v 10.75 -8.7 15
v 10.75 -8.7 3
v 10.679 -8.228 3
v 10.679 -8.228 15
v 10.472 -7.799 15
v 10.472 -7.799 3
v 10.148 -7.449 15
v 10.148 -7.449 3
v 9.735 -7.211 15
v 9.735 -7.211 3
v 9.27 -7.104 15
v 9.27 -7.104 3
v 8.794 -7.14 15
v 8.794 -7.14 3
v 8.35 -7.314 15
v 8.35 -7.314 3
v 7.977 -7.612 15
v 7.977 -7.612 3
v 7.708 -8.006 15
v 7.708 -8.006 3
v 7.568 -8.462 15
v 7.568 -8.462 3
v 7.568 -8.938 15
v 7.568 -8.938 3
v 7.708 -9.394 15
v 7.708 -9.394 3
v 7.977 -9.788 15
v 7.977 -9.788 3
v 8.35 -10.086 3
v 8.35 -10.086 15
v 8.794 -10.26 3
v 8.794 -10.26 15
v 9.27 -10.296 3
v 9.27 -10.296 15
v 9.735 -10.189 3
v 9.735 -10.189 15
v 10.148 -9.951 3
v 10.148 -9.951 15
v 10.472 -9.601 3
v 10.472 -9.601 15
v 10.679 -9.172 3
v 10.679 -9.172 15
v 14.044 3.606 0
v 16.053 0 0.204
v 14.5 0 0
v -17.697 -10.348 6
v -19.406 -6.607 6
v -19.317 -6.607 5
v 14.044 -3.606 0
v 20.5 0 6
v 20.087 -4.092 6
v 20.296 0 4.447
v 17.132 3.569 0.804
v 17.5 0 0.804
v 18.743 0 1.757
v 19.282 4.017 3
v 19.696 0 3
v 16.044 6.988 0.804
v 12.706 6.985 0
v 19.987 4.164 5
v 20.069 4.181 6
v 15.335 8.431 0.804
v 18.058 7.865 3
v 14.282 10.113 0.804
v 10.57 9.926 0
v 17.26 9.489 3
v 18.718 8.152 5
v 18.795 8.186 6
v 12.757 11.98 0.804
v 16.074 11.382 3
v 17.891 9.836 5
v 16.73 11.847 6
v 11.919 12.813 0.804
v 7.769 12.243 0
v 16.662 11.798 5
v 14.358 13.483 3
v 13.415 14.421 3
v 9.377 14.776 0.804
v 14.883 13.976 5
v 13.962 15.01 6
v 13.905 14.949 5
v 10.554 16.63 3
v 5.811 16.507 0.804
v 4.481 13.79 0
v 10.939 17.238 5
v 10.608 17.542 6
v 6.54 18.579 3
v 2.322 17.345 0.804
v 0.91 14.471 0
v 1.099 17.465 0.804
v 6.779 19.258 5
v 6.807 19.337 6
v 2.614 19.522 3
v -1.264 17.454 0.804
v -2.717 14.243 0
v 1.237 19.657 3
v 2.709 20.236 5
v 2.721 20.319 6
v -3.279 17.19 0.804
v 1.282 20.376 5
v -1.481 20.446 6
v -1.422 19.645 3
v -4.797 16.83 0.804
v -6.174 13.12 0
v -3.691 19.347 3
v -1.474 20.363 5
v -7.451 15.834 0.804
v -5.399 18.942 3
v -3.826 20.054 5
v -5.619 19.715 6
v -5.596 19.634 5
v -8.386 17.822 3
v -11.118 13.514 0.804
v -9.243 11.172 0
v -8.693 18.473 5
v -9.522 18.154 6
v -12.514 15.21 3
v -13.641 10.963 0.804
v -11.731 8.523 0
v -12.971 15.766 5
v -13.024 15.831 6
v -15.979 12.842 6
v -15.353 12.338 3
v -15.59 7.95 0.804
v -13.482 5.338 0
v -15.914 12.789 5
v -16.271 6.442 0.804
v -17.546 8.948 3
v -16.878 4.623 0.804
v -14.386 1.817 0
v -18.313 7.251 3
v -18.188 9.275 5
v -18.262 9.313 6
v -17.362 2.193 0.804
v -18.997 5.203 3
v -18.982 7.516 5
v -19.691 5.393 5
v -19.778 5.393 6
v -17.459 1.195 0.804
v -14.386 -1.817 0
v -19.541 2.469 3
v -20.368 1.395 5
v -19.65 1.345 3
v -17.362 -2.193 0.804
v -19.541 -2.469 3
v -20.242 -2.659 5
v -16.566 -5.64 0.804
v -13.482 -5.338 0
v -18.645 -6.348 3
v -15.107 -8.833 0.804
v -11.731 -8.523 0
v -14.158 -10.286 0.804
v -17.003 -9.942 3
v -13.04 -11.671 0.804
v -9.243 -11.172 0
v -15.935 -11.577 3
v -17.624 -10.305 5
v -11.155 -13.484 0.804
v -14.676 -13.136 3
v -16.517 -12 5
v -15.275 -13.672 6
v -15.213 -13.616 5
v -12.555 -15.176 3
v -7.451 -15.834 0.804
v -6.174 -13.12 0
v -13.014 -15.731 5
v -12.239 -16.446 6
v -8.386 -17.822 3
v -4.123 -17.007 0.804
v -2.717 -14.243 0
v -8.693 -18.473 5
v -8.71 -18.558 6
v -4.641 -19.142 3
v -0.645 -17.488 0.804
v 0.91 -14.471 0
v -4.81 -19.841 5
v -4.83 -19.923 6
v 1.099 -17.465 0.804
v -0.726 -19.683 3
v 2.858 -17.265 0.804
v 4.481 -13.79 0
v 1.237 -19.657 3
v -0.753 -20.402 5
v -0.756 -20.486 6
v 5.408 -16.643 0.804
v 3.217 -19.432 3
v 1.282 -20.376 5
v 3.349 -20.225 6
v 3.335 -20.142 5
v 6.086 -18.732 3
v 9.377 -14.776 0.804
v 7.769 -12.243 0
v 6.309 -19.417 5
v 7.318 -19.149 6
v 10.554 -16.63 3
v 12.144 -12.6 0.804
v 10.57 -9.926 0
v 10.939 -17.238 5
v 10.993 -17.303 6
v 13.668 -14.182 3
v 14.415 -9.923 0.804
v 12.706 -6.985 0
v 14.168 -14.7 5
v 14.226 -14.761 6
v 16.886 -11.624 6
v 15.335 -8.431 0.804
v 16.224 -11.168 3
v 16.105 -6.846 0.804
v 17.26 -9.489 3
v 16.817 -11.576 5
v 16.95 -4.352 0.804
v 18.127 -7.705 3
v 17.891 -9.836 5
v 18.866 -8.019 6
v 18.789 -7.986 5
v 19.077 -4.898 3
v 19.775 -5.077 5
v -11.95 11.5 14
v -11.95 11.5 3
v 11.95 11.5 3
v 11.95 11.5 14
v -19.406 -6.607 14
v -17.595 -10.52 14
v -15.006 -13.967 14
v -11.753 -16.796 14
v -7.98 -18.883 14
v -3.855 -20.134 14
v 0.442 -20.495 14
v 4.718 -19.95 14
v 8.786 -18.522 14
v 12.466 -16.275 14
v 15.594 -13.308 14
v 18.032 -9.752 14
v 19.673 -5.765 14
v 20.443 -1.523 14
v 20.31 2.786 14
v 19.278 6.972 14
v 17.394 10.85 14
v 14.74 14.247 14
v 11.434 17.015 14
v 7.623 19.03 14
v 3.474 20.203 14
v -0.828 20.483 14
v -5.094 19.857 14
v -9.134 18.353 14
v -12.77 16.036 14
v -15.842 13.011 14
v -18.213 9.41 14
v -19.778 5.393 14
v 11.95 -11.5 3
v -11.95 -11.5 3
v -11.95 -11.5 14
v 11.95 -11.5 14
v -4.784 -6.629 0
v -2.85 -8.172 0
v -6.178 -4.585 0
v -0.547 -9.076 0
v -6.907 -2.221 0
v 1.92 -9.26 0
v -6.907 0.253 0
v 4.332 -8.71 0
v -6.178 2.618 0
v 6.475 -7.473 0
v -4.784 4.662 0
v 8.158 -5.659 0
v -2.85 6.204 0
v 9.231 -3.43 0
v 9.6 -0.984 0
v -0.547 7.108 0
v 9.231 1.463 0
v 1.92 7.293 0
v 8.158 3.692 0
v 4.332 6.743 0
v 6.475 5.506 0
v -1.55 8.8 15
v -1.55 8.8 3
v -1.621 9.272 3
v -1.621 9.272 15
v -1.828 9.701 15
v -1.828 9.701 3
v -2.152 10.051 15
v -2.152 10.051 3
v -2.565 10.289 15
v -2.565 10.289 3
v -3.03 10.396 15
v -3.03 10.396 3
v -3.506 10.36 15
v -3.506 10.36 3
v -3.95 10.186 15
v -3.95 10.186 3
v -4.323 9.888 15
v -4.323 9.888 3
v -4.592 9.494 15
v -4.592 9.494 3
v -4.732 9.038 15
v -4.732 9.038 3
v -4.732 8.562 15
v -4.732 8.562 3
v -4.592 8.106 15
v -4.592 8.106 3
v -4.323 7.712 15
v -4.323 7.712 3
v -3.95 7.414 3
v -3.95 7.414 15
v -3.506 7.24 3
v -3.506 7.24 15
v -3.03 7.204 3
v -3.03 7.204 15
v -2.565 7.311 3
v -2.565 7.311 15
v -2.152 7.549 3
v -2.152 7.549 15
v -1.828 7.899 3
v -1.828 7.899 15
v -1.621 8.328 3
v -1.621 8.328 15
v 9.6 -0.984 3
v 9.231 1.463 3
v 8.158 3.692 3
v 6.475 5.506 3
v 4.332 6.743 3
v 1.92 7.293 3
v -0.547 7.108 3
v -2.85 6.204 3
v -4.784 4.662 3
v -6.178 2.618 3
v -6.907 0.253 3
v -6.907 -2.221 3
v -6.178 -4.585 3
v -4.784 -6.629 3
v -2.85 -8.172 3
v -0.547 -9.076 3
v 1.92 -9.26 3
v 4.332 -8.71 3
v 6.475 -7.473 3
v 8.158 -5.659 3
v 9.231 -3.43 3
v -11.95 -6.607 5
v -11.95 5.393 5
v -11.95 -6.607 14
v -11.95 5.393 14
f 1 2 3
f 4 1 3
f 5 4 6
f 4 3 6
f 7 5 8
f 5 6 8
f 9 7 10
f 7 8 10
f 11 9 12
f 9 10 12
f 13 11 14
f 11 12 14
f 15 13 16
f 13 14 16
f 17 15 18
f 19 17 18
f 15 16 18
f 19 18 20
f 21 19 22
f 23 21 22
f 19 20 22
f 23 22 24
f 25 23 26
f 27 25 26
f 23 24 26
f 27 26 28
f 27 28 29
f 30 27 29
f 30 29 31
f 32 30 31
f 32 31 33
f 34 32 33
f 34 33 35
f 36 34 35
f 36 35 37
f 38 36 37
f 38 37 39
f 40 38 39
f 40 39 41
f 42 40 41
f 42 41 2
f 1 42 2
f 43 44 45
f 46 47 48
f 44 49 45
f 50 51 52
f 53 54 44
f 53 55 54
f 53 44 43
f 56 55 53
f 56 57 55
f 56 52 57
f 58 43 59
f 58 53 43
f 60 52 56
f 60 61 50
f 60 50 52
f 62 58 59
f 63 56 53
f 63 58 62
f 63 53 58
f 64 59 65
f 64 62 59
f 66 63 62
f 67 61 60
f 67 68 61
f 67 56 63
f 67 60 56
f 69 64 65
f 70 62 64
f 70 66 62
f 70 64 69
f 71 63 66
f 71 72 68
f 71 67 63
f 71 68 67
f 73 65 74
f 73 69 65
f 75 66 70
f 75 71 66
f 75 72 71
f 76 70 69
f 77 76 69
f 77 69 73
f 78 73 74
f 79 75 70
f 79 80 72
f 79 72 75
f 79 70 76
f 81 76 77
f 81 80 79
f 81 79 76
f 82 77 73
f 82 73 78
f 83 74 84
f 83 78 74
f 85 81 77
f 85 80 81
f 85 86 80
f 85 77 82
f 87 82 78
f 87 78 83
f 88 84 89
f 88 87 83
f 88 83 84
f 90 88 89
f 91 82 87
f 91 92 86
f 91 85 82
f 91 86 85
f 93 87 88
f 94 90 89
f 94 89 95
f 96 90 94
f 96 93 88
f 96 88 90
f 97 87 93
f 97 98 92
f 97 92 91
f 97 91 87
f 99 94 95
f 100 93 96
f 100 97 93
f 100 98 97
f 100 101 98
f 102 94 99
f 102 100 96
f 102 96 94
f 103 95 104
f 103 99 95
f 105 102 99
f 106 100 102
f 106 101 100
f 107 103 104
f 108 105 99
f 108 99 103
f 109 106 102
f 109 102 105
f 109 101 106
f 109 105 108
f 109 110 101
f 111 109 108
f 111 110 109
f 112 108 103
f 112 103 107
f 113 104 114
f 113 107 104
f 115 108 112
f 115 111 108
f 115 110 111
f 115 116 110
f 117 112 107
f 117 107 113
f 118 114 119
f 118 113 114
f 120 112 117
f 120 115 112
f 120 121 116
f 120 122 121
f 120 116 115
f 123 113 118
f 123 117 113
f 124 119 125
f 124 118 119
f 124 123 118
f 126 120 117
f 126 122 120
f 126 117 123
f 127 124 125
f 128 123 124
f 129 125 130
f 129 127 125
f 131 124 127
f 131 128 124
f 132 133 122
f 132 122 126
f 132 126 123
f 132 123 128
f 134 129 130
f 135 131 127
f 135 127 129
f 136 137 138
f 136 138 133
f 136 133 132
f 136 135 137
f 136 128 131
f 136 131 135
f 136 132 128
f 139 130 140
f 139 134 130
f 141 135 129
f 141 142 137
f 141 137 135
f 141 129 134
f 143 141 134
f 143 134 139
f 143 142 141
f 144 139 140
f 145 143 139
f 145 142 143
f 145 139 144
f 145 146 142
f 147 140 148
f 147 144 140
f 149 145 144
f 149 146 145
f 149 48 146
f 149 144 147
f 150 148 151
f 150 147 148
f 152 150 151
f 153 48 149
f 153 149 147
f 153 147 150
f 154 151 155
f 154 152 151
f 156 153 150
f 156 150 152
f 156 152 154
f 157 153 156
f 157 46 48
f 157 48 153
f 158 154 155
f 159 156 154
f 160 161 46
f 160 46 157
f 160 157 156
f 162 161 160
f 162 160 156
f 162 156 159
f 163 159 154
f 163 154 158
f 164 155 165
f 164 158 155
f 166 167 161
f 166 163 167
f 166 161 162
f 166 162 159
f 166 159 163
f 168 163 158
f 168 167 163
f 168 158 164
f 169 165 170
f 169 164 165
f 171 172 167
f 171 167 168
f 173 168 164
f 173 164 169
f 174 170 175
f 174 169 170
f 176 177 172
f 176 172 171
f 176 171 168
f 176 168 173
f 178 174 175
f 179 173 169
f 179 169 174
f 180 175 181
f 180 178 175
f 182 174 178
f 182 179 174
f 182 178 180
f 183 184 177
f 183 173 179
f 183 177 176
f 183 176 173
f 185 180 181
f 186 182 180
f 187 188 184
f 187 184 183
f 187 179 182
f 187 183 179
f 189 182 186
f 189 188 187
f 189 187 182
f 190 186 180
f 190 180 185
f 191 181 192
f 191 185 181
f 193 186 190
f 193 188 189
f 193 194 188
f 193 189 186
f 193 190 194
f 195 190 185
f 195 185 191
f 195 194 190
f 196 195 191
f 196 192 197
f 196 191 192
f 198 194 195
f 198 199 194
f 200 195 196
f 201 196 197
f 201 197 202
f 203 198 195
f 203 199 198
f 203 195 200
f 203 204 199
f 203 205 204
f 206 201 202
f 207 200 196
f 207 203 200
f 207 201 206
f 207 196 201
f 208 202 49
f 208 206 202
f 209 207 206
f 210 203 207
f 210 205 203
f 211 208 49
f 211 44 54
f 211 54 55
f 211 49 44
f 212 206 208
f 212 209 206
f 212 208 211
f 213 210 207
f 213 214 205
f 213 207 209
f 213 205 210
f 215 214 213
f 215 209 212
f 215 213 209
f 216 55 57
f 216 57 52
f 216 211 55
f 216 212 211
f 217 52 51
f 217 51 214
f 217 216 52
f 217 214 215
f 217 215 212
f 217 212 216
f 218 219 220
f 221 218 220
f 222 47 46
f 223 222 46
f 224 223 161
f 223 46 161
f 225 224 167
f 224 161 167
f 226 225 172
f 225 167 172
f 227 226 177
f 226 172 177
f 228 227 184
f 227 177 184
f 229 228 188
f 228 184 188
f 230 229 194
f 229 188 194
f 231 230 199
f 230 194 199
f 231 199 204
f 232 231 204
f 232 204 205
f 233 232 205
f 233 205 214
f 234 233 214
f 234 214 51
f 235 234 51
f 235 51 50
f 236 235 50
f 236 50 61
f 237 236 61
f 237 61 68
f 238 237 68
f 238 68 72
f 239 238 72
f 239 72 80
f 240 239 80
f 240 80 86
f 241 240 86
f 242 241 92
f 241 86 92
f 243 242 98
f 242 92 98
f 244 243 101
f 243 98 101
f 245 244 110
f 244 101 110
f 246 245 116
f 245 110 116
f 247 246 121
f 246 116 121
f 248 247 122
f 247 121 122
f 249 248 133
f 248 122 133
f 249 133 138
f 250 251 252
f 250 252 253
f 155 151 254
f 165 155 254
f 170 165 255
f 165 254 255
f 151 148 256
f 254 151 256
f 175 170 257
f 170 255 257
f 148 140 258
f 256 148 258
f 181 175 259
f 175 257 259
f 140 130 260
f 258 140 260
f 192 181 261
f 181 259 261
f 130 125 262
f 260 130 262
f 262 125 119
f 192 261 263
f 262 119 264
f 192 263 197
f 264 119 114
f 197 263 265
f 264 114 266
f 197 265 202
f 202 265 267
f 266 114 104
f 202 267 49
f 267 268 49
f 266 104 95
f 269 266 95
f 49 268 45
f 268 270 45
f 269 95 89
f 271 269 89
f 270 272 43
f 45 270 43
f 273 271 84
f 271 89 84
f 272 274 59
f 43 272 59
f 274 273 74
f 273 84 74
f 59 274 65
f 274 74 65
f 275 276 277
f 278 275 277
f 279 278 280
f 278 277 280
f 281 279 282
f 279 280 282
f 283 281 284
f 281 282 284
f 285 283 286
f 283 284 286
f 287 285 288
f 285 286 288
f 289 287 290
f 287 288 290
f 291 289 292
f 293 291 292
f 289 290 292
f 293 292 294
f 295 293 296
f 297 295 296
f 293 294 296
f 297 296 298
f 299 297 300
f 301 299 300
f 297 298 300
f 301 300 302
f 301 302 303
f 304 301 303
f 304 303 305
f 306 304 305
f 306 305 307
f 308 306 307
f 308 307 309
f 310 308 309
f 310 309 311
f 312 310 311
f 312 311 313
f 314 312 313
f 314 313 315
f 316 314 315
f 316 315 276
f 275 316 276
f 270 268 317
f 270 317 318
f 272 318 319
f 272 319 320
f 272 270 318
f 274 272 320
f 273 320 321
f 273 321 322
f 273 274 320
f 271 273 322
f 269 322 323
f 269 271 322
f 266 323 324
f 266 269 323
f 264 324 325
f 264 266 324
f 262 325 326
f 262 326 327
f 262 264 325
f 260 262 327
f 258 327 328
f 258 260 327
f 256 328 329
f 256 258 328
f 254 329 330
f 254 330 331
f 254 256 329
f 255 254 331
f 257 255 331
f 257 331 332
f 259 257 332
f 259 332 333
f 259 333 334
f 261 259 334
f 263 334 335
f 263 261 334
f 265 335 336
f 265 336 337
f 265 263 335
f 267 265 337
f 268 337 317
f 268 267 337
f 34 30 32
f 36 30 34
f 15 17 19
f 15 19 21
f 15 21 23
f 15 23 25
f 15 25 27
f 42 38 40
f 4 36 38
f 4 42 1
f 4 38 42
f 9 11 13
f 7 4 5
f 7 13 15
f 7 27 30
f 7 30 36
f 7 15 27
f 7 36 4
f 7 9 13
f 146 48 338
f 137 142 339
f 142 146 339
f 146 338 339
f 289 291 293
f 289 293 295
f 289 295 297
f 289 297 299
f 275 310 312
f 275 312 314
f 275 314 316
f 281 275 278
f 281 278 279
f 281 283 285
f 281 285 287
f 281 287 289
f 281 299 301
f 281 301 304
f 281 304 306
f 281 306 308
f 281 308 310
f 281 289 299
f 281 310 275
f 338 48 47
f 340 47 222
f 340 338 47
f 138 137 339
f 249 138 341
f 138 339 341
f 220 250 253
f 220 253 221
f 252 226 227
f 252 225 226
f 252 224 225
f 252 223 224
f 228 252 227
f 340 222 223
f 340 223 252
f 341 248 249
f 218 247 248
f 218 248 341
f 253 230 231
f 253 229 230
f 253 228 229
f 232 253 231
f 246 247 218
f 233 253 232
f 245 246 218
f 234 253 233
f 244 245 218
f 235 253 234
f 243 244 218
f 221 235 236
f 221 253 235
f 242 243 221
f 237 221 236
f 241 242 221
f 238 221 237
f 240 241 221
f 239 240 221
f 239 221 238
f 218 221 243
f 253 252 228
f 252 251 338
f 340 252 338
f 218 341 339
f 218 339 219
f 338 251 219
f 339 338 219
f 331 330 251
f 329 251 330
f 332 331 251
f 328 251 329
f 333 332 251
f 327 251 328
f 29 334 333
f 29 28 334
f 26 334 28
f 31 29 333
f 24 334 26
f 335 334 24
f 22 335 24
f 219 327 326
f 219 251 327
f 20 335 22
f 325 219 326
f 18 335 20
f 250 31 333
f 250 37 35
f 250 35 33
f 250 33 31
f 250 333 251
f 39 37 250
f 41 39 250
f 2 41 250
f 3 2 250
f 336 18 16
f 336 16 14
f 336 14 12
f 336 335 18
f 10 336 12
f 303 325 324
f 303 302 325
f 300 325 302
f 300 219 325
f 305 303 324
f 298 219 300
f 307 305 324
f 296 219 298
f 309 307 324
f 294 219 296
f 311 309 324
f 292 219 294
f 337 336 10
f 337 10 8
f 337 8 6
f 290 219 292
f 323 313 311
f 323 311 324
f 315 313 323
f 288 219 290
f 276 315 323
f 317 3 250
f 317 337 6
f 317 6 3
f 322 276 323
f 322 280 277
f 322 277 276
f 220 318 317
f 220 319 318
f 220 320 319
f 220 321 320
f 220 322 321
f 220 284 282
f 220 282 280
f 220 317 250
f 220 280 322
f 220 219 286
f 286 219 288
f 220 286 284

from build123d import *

# Parameters (mm, degrees)
F0_R     = 20.5
F0_R_2   = 19
F0_W     = 23.9
F0_H     = 23
F2_DEPTH = 14
F1_W     = 23.9
F1_H     = 23
F1_R     = 2.25
F1_R_2   = 8.3
F0_R_3   = 2.25
F0_R_4   = 1.6
F3_DEPTH = 3
F4_R     = 6
F6_DEPTH = 15
F5_W     = 12
F5_H     = 3
F7_DEPTH = 25
F8_DEPTH = 25


with BuildPart() as f2:
    # F0 (on Top) → F2 (new body)
    with BuildSketch(Plane.XY):
        Circle(F0_R)
        Circle(F0_R_2, mode=Mode.SUBTRACT)
        Circle(F0_R_2)
        Rectangle(F0_W, F0_H, mode=Mode.SUBTRACT)
    extrude(amount=F2_DEPTH)

    # F1 (on face) + F0 (on Top) → F3 (join)
    with BuildSketch(Plane.XY):
        Rectangle(F1_W, F1_H)
        with Locations((9.15, -8.7)):
            Circle(F1_R, mode=Mode.SUBTRACT)
        with Locations((1.3, -0.9836626705)):
            Circle(F1_R_2, mode=Mode.SUBTRACT)
        with Locations((-3.15, 8.8)):
            Circle(F1_R, mode=Mode.SUBTRACT)
    with BuildSketch(Plane.XY):
        with Locations((-3.15, 8.8)):
            Circle(F0_R_3)
        with Locations((-3.15, 8.8)):
            Circle(F0_R_4, mode=Mode.SUBTRACT)
        with Locations((9.15, -8.7)):
            Circle(F0_R_3)
        with Locations((9.15, -8.7)):
            Circle(F0_R_4, mode=Mode.SUBTRACT)
        with Locations((-3.15, 8.8)):
            Circle(F0_R_4)
        with Locations((9.15, -8.7)):
            Circle(F0_R_4)
    extrude(amount=F3_DEPTH)

    # F4
    f4_edges = [f2.edges().sort_by_distance(p)[0] for p in [
        (-20.5, 0, 0),
    ]]
    fillet(f4_edges, radius=F4_R)

    # F0 (on Top) → F6 (join)
    with BuildSketch(Plane.XY):
        with Locations((-3.15, 8.8)):
            Circle(F0_R_4)
        with Locations((9.15, -8.7)):
            Circle(F0_R_4)
    extrude(amount=F6_DEPTH)

    # F5 (on Right) → F7 (cut)
    with BuildSketch(Plane.YZ):
        with Locations((-0.6070649059, 6.5)):
            Rectangle(F5_W, F5_H)
    extrude(amount=-F7_DEPTH, mode=Mode.SUBTRACT)

    # F8 (cut): a face of the model
    f8_faces = [f2.faces().sort_by_distance(p)[0] for p in [
        (-16.077019229, -0.5627771714, 8),
    ]]
    extrude(f8_faces, amount=-F8_DEPTH, mode=Mode.SUBTRACT)


solid = f2.part
